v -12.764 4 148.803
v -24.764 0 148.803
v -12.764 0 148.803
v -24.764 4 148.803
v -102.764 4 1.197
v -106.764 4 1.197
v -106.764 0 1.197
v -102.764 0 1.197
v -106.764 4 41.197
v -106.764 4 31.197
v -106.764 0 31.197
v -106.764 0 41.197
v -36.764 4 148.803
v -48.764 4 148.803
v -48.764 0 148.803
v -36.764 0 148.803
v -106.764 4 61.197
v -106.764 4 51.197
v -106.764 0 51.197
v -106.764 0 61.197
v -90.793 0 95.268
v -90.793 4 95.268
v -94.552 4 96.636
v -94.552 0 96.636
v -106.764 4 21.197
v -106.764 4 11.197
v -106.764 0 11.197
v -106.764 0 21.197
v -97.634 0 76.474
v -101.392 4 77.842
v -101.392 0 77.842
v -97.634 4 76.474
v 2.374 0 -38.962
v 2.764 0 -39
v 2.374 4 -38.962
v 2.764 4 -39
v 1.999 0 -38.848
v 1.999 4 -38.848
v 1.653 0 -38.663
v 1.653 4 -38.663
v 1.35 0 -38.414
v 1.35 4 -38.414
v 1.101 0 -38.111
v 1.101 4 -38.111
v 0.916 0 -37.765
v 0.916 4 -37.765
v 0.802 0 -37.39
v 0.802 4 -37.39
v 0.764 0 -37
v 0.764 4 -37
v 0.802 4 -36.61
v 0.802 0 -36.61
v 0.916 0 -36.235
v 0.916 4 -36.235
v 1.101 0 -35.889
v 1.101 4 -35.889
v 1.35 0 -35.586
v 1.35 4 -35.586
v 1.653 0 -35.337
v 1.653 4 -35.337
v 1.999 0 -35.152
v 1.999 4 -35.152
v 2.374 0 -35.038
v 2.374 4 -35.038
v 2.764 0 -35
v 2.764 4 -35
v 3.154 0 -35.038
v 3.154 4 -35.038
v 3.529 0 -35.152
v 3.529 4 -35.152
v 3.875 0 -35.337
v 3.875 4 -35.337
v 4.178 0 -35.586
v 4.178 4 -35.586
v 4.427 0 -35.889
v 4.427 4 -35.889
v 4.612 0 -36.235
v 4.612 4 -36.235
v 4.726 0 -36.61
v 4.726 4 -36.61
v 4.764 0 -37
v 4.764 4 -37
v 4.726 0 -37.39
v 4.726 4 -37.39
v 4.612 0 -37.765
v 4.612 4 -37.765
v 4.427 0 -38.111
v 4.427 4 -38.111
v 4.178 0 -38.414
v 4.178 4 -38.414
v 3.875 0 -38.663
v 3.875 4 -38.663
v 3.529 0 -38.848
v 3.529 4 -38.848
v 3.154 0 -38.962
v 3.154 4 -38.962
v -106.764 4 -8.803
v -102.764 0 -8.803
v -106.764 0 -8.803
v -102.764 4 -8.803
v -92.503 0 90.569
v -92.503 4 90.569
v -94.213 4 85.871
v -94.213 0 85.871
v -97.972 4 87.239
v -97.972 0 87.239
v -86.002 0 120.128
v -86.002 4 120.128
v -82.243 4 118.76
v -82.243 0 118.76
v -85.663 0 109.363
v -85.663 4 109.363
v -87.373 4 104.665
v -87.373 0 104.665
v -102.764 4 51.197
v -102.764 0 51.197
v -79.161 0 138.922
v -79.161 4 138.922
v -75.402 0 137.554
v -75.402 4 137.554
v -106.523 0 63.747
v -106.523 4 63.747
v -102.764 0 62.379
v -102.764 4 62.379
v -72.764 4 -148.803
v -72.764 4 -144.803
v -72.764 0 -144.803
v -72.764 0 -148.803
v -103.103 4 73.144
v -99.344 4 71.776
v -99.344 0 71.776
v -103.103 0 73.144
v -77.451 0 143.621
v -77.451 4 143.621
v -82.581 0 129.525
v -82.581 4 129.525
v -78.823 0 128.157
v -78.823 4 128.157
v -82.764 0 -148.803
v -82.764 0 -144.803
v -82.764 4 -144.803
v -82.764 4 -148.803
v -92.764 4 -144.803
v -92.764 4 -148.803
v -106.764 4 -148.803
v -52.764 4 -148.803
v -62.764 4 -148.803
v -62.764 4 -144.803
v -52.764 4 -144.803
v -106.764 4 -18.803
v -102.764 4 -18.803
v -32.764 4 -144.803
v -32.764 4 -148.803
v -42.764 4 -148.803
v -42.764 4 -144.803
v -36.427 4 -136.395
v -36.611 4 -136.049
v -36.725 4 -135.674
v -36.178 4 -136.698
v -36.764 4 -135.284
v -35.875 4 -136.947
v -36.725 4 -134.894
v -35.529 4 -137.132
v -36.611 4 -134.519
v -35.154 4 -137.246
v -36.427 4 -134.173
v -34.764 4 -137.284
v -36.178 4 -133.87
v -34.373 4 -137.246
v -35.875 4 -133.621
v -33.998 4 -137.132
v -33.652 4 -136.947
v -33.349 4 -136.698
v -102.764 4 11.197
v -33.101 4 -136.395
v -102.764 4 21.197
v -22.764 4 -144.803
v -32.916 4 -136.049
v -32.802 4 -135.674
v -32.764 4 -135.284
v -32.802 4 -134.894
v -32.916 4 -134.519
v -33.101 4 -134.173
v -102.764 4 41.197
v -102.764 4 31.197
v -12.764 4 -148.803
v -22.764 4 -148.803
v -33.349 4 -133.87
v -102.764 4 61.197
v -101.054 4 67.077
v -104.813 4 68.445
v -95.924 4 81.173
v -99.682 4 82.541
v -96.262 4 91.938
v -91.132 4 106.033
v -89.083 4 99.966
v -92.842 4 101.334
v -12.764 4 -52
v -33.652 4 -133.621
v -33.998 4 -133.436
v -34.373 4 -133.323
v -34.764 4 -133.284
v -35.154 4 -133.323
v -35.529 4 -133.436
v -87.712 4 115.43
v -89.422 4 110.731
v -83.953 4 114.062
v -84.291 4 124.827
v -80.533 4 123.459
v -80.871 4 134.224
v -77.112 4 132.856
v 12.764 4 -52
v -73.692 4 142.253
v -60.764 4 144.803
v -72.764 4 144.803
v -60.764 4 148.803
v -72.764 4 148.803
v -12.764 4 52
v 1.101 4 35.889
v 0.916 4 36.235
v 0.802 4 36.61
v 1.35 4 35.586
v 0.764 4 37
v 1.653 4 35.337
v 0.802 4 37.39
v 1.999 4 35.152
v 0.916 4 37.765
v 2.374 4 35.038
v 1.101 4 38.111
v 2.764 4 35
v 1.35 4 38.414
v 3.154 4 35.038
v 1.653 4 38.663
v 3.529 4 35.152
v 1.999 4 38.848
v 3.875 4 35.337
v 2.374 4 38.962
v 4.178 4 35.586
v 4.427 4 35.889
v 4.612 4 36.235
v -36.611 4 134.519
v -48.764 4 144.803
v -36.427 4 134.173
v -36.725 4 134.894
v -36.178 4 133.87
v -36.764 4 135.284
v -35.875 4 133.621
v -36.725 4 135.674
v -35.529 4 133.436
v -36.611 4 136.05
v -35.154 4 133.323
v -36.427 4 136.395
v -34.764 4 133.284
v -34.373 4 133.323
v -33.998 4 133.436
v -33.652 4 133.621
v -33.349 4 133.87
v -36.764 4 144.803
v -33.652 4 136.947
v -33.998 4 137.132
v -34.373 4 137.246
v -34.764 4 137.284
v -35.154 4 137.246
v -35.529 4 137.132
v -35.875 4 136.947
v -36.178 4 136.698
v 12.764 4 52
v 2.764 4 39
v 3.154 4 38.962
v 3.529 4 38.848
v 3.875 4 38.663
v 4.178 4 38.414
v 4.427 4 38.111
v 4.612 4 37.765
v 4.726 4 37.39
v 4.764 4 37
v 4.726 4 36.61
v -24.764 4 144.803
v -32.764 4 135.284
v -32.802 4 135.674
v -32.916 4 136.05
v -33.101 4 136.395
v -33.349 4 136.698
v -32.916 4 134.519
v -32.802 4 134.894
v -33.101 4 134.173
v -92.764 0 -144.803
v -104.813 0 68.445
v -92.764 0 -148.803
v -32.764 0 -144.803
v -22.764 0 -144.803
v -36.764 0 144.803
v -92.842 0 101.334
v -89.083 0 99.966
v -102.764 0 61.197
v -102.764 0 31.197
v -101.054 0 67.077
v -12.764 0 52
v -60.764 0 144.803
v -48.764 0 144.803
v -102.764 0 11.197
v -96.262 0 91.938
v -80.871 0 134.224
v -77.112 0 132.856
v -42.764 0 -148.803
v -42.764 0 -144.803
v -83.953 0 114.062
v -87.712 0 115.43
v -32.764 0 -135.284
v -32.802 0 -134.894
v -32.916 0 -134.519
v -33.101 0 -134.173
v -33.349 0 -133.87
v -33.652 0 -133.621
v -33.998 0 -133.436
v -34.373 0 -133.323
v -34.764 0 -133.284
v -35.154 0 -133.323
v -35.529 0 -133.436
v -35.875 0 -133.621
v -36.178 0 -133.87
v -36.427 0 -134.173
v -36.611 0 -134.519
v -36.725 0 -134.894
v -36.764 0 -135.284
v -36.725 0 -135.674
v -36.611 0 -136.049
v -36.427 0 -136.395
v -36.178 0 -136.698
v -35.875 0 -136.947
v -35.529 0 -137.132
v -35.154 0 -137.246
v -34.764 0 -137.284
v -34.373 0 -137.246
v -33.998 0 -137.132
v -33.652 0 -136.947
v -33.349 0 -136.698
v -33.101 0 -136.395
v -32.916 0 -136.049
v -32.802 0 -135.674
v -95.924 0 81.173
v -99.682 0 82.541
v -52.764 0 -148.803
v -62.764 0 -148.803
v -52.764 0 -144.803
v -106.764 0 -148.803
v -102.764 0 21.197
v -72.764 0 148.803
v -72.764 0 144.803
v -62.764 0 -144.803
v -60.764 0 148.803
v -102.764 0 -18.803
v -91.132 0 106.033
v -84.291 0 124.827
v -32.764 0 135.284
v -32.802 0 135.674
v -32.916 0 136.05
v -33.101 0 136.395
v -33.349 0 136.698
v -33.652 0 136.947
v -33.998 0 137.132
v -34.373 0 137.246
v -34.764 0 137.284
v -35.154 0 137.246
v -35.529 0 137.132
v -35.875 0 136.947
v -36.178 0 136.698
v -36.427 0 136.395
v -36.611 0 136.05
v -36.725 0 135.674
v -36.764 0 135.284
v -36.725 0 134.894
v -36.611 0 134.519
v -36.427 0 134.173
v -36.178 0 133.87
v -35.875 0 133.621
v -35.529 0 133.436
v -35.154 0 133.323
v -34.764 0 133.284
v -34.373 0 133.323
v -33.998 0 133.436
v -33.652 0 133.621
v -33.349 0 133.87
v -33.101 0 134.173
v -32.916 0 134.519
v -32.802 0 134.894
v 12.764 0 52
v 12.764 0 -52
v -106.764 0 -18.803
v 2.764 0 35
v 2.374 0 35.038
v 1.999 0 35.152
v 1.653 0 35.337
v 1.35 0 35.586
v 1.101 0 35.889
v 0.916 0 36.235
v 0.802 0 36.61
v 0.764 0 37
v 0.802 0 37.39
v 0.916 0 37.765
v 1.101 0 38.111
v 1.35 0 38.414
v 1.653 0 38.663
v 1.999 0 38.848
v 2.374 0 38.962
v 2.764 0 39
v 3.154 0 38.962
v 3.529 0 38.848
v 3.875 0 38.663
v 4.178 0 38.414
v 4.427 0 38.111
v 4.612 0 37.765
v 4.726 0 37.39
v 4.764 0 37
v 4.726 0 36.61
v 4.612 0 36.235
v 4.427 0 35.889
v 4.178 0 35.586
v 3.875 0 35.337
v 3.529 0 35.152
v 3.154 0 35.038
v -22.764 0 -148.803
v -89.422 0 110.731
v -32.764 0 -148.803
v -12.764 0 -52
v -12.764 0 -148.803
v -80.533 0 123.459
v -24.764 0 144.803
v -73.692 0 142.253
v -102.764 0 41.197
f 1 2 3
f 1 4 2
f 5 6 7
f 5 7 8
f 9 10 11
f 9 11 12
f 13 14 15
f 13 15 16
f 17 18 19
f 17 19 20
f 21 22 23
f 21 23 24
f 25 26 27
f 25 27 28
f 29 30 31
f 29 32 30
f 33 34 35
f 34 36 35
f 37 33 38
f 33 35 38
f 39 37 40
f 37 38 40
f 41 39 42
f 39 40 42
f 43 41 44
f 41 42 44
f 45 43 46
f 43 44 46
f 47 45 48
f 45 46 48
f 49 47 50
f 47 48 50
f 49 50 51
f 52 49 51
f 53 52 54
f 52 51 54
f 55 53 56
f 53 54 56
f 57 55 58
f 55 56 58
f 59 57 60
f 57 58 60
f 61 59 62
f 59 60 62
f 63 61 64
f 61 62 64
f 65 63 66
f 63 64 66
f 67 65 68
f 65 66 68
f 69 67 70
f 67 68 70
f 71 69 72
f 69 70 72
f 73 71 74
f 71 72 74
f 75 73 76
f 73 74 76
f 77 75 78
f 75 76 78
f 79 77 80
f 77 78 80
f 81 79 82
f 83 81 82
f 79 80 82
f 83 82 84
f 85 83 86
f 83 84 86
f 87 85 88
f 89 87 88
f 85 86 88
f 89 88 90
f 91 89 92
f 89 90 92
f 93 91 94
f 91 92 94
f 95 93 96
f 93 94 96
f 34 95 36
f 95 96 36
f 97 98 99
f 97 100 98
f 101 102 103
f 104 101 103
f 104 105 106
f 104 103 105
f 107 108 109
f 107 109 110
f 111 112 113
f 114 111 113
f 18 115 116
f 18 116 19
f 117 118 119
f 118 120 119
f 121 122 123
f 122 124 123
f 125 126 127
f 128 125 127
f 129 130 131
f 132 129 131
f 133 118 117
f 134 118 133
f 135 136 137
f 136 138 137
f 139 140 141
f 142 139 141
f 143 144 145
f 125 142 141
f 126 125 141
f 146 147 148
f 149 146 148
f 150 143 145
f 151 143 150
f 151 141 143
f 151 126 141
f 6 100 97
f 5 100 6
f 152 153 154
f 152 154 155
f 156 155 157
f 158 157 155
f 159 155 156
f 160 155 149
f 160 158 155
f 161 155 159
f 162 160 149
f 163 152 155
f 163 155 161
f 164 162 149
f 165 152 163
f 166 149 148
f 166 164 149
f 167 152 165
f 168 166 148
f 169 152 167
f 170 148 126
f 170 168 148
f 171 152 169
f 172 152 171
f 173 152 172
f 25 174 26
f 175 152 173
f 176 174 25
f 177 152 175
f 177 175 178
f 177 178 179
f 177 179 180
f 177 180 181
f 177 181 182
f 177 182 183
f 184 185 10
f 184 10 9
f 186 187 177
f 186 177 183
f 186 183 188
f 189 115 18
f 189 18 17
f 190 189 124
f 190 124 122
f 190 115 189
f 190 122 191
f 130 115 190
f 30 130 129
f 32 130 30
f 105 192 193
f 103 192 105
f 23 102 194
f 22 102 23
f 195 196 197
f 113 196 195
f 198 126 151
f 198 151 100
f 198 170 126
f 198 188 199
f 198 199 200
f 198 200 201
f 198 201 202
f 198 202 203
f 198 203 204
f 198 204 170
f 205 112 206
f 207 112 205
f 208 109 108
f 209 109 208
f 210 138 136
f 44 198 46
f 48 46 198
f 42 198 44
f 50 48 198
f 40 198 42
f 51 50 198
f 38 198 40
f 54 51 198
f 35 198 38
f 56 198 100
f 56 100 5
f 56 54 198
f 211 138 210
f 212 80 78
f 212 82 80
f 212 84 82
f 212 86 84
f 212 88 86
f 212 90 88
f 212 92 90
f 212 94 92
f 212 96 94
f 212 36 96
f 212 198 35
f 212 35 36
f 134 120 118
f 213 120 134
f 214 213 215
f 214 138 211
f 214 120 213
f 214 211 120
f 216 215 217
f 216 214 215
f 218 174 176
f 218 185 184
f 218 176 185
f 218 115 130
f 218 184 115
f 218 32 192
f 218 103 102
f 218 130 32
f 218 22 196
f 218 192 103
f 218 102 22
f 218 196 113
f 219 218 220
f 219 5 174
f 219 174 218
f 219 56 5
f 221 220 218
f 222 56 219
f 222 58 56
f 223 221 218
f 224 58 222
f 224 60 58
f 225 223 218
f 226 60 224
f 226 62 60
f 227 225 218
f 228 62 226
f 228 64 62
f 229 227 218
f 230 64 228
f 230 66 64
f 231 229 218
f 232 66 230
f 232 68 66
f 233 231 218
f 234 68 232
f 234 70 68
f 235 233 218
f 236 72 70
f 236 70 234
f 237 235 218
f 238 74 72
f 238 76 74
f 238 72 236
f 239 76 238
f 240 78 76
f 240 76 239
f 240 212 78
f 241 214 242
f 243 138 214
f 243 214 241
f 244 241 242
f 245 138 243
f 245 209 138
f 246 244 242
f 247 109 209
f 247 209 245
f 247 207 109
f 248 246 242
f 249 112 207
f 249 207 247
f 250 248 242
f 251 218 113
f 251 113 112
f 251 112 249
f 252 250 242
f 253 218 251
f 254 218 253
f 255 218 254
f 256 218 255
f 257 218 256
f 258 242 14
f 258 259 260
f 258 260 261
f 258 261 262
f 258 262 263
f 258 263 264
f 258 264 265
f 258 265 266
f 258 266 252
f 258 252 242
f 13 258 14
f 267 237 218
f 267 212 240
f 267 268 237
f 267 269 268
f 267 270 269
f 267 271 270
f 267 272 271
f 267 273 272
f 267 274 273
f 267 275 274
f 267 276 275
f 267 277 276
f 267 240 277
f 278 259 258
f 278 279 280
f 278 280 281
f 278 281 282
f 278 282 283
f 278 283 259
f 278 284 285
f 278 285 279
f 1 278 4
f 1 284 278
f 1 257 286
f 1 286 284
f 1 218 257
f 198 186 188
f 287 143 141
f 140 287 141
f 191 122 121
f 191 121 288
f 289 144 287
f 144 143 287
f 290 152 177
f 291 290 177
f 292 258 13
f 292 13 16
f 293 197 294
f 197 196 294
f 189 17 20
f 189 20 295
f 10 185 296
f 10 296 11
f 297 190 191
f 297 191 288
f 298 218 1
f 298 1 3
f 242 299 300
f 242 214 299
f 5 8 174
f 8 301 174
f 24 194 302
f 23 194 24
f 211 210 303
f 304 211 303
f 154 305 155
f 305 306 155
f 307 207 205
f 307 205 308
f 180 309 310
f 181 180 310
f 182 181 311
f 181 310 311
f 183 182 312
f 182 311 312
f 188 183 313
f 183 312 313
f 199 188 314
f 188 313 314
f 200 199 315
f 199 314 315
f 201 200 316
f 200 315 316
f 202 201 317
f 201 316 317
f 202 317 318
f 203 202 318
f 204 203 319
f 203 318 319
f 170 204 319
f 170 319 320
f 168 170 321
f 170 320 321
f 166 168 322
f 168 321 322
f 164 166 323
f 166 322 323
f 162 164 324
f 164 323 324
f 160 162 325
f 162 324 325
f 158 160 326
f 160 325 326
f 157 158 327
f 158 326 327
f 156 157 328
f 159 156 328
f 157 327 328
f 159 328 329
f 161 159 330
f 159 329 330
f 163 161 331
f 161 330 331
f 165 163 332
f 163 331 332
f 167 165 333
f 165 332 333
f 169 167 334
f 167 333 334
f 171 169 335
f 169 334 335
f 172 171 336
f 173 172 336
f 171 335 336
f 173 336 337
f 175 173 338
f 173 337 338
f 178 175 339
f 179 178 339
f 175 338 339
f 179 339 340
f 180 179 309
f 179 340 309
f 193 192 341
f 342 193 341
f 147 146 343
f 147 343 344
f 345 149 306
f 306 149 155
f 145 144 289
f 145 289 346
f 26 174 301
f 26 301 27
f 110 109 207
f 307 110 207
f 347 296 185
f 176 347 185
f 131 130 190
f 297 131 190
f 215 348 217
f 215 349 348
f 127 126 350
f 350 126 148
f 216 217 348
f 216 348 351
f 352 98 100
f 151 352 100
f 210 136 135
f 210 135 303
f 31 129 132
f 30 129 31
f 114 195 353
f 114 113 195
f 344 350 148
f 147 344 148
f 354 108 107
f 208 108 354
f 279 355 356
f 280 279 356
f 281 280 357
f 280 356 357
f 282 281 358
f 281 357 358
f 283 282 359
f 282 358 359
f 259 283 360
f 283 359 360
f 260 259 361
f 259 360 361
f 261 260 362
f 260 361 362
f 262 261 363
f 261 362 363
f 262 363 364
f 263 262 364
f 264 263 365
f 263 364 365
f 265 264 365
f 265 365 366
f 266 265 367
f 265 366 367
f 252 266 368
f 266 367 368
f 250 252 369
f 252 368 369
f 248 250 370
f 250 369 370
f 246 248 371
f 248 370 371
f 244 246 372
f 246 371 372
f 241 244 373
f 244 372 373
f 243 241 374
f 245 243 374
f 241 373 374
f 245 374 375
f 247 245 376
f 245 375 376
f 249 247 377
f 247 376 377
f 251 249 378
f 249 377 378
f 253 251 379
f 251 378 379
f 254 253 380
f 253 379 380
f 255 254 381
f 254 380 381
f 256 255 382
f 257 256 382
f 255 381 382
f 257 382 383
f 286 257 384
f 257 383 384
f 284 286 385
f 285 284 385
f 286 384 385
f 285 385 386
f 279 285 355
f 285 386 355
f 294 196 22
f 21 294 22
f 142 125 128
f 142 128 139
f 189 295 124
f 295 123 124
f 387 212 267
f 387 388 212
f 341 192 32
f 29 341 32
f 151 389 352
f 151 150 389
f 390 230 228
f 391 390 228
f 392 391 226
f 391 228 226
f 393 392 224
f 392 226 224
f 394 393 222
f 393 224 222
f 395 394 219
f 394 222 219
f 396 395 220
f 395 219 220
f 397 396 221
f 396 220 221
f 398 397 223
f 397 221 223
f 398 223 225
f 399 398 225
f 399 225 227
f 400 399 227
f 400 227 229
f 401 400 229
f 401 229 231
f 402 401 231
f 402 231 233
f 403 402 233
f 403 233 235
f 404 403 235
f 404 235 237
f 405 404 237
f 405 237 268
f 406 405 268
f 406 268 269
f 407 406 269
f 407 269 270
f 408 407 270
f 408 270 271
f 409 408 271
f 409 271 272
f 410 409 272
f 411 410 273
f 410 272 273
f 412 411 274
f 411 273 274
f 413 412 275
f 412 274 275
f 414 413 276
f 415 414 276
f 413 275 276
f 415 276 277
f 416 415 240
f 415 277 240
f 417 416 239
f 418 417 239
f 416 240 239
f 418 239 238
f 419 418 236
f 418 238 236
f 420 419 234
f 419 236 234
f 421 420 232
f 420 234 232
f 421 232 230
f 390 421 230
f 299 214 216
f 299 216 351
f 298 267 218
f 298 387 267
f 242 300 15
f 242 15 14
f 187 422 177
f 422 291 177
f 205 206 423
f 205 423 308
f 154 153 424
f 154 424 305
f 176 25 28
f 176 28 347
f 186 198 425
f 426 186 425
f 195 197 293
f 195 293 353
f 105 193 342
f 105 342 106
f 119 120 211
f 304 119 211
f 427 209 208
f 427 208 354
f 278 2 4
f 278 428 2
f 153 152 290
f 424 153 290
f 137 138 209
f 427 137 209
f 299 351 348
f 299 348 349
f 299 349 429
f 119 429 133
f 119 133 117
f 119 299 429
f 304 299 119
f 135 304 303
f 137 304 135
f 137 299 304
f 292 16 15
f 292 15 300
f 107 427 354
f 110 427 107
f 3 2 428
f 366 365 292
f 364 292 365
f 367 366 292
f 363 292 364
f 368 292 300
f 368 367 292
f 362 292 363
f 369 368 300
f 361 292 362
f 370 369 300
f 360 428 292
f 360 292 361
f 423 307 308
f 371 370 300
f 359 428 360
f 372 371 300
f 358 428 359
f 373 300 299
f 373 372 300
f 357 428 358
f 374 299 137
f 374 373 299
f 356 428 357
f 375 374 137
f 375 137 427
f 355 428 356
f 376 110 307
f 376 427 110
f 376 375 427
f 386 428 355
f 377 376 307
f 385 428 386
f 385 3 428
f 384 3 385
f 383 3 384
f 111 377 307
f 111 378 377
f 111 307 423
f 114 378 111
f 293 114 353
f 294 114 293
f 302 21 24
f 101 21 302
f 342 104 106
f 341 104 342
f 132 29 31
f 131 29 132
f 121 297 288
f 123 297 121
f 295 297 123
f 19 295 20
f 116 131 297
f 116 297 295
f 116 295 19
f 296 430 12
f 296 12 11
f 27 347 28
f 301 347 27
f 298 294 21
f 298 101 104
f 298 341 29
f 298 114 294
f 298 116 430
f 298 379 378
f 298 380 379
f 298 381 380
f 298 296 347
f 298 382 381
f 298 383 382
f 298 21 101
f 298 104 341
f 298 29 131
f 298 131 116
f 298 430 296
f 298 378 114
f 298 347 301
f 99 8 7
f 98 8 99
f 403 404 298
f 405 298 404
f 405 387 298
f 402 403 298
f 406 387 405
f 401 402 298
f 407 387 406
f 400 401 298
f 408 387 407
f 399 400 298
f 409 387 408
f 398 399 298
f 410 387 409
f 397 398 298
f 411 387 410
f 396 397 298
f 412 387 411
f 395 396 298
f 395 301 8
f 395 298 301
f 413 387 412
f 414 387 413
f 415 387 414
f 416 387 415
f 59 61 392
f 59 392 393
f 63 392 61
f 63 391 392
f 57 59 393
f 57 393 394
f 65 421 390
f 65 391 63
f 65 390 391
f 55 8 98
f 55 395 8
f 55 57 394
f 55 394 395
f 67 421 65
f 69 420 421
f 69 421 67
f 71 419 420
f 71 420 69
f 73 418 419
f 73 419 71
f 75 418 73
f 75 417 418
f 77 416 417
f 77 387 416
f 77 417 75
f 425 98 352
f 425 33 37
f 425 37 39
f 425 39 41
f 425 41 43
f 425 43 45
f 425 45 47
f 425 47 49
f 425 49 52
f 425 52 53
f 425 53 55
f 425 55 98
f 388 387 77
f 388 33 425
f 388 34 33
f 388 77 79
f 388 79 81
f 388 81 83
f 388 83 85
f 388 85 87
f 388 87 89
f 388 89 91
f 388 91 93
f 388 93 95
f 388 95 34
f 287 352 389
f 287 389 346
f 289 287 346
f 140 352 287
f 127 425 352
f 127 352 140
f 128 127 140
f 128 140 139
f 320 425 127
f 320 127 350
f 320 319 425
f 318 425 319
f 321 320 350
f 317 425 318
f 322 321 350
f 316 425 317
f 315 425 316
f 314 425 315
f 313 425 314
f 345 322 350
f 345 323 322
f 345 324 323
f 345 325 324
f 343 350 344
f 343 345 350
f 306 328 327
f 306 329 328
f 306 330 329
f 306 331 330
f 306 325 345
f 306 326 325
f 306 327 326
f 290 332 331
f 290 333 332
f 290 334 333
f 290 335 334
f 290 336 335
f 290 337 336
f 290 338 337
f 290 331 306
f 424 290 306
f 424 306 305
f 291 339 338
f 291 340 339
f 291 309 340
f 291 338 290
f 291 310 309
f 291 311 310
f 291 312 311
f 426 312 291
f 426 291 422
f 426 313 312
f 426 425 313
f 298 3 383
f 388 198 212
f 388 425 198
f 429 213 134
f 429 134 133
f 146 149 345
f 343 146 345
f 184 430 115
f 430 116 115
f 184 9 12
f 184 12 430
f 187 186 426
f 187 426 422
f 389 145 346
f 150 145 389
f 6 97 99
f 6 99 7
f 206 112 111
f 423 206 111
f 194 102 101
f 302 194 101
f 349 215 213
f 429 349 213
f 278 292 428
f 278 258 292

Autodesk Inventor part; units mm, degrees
ref_plane "YZ Plane" through (0, 0, 0) normal (1, 0, 0) x (0, 1, 0)
ref_plane "XZ Plane" through (0, 0, 0) normal (0, 1, 0) x (-1, 0, 0)
ref_plane "XY Plane" through (0, 0, 0) normal (0, 0, 1) x (1, 0, 0)
sketch "Эскиз1" plane through (2.236, 0, -46.8876) normal (0, 1, 0) x (-1, 0, 0)
  line L0 (-10.528, 98.8876) -> (15, 98.8876)
  line L1 (15, 98.8876) -> (15, -5.1124)
  line L2 (15, -5.1124) -> (-10.528, -5.1124)
  line L3 (-10.528, -5.1124) -> (-10.528, 98.8876)
  point P0 (0, 0)
  dimension "d0" = 25.528
  dimension "d1" = 104
extrude "Выдавливание1" add sketch "Эскиз1" along normal blind 4
sketch "Эскиз2" plane through (2.236, 4, -46.8876) normal (0, 1, 0) x (0, 0, -1)
  circle A0 centre (-9.8876, -0.528) radius 2 projected
  circle A1 centre (-83.8876, -0.528) radius 2 projected
  point P0 (0, 0)
extrude "Выдавливание2" cut sketch "Эскиз2" against normal blind 4
sketch "Эскиз3" plane through (2.236, 4, -46.8876) normal (0, 1, 0) x (1, 0, 0)
  line L0 (-75, -191.6906) -> (-15, -191.6906)
  line L1 (-15, -191.6906) -> (-15, 97.9154)
  line L2 (-15, 97.9154) -> (-75, 97.9154)
  line L3 (-75, 97.9154) -> (-75, -191.6906)
  line L4 (-15, -98.8876) -> (10.528, -98.8876) projected
  line L5 (10.528, 5.1124) -> (-15, 5.1124) projected
  point P0 (-2.236, -46.8876)
  dimension "d8" = 92.803
  dimension "d9" = 92.803
  dimension "d10" = 60
extrude "Выдавливание3" add sketch "Эскиз3" against normal blind 4
sketch "Эскиз4" plane through (2.236, 4, -46.8876) normal (0, 1, 0) x (1, 0, 0)
  line L0 (-75, -191.6906) -> (-75, 97.9154) projected
  line L1 (-75, -191.6906) -> (-105, -109.2663)
  line L2 (-105, -109.2663) -> (-105, 97.9154)
  line L3 (-105, 97.9154) -> (-75, 97.9154)
  line L4 (-2.236, -46.8876) -> (-20.0662, -46.8876)
  dimension "d13" = 30
  dimension "d14" = 90
  dimension "d17" = 20
extrude "Выдавливание4" add sketch "Эскиз4" against normal blind 4
sketch "Эскиз5" plane through (-12.764, 0, 144.803) normal (0, 0, 1) x (1, 0, 0)
  line L0 (-60, 4) -> (0, 4) projected
  line L1 (0, 0) -> (-60, 0) projected
  line L2 (-60, 4) -> (-48, 4)
  line L3 (-48, 4) -> (-48, 0)
  line L4 (-48, 0) -> (-60, 0)
  line L5 (-60, 0) -> (-60, 4)
  point P0 (12.764, 0)
  dimension "d18" = 12
extrude "Выдавливание5" add sketch "Эскиз5" along normal blind 4
pattern_linear "Прямоуг.массив1" count 3 spacing 24 along (1, 0, 0) of "Выдавливание5"
sketch "Эскиз6" plane through (-12.764, 0, -144.803) normal (0, 0, -1) x (-1, 0, 0)
  line L0 (90, 4) -> (60, 4) projected
  line L1 (60, 0) -> (90, 0) projected
  line L2 (90, 4) -> (80, 4)
  line L3 (80, 4) -> (80, 0)
  line L4 (80, 0) -> (90, 0)
  line L5 (90, 0) -> (90, 4)
  point P0 (-12.764, 0)
  point P1 (90, 0)
  point P2 (80, 4)
  dimension "d24" = 10
extrude "Выдавливание6" add sketch "Эскиз6" along normal blind 4
pattern_linear "Прямоуг.массив2" count 5 spacing 20 along (1, 0, 0) of "Выдавливание6"
sketch "Эскиз7" plane through (2.236, 4, -46.8876) normal (0, 1, 0) x (1, 0, 0)
  line L0 (-105, 101.9154) -> (-105, -109.2663) projected
  line L1 (-105, 101.9154) -> (-109, 101.9154)
  line L2 (-109, 101.9154) -> (-109, 91.9154)
  line L3 (-109, 91.9154) -> (-105, 91.9154)
  line L4 (-105, 91.9154) -> (-105, 101.9154)
  point P0 (-2.236, -46.8876)
  dimension "d30" = 4
  dimension "d31" = 10
extrude "Выдавливание7" add sketch "Эскиз7" against normal blind 4
pattern_linear "Прямоуг.массив3" count 11 spacing 20 along (0, 0, 1) of "Выдавливание7"
sketch "Эскиз8" plane through (2.236, 0, -46.8876) normal (0, -1, 0) x (1, 0, 0)
  circle A0 centre (-36.9996, -88.3965) radius 2 projected
  circle A1 centre (-36.9996, 182.1718) radius 2 projected
  point P0 (-2.236, 46.8876)
extrude "Выдавливание8" cut sketch "Эскиз8" against normal blind 4
sketch "Эскиз9" plane through (-102.764, 0, 62.3787) normal (-0.9397, 0, 0.342) x (0.342, 0, 0.9397)
  line L0 (0, 4) -> (0, 0) projected
  line L1 (0, 4) -> (5, 4)
  line L2 (5, 4) -> (5, 0)
  line L3 (5, 0) -> (0, 0)
  line L4 (0, 0) -> (0, 4)
  point P0 (-23.4694, 0)
  dimension "d39" = 5
  dimension "d40" = 4
extrude "Выдавливание9" add sketch "Эскиз9" along normal blind 4
pattern_linear "Прямоуг.массив4" count 9 spacing 10 along (0.342, 0, 0.9397) of "Выдавливание9"
sketch "Эскиз10" plane through (2.236, 4, -46.8876) normal (0, 1, 0) x (1, 0, 0)
  line L0 (-109, 101.9154) -> (-109, 91.9154) projected
  line L1 (-109, 101.9154) -> (-105, 101.9154)
  line L2 (-105, 101.9154) -> (-105, -23.0846)
  line L3 (-105, -23.0846) -> (-109, -23.0846)
  line L4 (-109, -23.0846) -> (-109, 101.9154)
  point P0 (-2.236, -46.8876)
  dimension "d46" = 125
extrude "Выдавливание10" add sketch "Эскиз10" against normal blind 4
properties part number "KB33-046-004-008 - Центральная правая боковая пластина"
